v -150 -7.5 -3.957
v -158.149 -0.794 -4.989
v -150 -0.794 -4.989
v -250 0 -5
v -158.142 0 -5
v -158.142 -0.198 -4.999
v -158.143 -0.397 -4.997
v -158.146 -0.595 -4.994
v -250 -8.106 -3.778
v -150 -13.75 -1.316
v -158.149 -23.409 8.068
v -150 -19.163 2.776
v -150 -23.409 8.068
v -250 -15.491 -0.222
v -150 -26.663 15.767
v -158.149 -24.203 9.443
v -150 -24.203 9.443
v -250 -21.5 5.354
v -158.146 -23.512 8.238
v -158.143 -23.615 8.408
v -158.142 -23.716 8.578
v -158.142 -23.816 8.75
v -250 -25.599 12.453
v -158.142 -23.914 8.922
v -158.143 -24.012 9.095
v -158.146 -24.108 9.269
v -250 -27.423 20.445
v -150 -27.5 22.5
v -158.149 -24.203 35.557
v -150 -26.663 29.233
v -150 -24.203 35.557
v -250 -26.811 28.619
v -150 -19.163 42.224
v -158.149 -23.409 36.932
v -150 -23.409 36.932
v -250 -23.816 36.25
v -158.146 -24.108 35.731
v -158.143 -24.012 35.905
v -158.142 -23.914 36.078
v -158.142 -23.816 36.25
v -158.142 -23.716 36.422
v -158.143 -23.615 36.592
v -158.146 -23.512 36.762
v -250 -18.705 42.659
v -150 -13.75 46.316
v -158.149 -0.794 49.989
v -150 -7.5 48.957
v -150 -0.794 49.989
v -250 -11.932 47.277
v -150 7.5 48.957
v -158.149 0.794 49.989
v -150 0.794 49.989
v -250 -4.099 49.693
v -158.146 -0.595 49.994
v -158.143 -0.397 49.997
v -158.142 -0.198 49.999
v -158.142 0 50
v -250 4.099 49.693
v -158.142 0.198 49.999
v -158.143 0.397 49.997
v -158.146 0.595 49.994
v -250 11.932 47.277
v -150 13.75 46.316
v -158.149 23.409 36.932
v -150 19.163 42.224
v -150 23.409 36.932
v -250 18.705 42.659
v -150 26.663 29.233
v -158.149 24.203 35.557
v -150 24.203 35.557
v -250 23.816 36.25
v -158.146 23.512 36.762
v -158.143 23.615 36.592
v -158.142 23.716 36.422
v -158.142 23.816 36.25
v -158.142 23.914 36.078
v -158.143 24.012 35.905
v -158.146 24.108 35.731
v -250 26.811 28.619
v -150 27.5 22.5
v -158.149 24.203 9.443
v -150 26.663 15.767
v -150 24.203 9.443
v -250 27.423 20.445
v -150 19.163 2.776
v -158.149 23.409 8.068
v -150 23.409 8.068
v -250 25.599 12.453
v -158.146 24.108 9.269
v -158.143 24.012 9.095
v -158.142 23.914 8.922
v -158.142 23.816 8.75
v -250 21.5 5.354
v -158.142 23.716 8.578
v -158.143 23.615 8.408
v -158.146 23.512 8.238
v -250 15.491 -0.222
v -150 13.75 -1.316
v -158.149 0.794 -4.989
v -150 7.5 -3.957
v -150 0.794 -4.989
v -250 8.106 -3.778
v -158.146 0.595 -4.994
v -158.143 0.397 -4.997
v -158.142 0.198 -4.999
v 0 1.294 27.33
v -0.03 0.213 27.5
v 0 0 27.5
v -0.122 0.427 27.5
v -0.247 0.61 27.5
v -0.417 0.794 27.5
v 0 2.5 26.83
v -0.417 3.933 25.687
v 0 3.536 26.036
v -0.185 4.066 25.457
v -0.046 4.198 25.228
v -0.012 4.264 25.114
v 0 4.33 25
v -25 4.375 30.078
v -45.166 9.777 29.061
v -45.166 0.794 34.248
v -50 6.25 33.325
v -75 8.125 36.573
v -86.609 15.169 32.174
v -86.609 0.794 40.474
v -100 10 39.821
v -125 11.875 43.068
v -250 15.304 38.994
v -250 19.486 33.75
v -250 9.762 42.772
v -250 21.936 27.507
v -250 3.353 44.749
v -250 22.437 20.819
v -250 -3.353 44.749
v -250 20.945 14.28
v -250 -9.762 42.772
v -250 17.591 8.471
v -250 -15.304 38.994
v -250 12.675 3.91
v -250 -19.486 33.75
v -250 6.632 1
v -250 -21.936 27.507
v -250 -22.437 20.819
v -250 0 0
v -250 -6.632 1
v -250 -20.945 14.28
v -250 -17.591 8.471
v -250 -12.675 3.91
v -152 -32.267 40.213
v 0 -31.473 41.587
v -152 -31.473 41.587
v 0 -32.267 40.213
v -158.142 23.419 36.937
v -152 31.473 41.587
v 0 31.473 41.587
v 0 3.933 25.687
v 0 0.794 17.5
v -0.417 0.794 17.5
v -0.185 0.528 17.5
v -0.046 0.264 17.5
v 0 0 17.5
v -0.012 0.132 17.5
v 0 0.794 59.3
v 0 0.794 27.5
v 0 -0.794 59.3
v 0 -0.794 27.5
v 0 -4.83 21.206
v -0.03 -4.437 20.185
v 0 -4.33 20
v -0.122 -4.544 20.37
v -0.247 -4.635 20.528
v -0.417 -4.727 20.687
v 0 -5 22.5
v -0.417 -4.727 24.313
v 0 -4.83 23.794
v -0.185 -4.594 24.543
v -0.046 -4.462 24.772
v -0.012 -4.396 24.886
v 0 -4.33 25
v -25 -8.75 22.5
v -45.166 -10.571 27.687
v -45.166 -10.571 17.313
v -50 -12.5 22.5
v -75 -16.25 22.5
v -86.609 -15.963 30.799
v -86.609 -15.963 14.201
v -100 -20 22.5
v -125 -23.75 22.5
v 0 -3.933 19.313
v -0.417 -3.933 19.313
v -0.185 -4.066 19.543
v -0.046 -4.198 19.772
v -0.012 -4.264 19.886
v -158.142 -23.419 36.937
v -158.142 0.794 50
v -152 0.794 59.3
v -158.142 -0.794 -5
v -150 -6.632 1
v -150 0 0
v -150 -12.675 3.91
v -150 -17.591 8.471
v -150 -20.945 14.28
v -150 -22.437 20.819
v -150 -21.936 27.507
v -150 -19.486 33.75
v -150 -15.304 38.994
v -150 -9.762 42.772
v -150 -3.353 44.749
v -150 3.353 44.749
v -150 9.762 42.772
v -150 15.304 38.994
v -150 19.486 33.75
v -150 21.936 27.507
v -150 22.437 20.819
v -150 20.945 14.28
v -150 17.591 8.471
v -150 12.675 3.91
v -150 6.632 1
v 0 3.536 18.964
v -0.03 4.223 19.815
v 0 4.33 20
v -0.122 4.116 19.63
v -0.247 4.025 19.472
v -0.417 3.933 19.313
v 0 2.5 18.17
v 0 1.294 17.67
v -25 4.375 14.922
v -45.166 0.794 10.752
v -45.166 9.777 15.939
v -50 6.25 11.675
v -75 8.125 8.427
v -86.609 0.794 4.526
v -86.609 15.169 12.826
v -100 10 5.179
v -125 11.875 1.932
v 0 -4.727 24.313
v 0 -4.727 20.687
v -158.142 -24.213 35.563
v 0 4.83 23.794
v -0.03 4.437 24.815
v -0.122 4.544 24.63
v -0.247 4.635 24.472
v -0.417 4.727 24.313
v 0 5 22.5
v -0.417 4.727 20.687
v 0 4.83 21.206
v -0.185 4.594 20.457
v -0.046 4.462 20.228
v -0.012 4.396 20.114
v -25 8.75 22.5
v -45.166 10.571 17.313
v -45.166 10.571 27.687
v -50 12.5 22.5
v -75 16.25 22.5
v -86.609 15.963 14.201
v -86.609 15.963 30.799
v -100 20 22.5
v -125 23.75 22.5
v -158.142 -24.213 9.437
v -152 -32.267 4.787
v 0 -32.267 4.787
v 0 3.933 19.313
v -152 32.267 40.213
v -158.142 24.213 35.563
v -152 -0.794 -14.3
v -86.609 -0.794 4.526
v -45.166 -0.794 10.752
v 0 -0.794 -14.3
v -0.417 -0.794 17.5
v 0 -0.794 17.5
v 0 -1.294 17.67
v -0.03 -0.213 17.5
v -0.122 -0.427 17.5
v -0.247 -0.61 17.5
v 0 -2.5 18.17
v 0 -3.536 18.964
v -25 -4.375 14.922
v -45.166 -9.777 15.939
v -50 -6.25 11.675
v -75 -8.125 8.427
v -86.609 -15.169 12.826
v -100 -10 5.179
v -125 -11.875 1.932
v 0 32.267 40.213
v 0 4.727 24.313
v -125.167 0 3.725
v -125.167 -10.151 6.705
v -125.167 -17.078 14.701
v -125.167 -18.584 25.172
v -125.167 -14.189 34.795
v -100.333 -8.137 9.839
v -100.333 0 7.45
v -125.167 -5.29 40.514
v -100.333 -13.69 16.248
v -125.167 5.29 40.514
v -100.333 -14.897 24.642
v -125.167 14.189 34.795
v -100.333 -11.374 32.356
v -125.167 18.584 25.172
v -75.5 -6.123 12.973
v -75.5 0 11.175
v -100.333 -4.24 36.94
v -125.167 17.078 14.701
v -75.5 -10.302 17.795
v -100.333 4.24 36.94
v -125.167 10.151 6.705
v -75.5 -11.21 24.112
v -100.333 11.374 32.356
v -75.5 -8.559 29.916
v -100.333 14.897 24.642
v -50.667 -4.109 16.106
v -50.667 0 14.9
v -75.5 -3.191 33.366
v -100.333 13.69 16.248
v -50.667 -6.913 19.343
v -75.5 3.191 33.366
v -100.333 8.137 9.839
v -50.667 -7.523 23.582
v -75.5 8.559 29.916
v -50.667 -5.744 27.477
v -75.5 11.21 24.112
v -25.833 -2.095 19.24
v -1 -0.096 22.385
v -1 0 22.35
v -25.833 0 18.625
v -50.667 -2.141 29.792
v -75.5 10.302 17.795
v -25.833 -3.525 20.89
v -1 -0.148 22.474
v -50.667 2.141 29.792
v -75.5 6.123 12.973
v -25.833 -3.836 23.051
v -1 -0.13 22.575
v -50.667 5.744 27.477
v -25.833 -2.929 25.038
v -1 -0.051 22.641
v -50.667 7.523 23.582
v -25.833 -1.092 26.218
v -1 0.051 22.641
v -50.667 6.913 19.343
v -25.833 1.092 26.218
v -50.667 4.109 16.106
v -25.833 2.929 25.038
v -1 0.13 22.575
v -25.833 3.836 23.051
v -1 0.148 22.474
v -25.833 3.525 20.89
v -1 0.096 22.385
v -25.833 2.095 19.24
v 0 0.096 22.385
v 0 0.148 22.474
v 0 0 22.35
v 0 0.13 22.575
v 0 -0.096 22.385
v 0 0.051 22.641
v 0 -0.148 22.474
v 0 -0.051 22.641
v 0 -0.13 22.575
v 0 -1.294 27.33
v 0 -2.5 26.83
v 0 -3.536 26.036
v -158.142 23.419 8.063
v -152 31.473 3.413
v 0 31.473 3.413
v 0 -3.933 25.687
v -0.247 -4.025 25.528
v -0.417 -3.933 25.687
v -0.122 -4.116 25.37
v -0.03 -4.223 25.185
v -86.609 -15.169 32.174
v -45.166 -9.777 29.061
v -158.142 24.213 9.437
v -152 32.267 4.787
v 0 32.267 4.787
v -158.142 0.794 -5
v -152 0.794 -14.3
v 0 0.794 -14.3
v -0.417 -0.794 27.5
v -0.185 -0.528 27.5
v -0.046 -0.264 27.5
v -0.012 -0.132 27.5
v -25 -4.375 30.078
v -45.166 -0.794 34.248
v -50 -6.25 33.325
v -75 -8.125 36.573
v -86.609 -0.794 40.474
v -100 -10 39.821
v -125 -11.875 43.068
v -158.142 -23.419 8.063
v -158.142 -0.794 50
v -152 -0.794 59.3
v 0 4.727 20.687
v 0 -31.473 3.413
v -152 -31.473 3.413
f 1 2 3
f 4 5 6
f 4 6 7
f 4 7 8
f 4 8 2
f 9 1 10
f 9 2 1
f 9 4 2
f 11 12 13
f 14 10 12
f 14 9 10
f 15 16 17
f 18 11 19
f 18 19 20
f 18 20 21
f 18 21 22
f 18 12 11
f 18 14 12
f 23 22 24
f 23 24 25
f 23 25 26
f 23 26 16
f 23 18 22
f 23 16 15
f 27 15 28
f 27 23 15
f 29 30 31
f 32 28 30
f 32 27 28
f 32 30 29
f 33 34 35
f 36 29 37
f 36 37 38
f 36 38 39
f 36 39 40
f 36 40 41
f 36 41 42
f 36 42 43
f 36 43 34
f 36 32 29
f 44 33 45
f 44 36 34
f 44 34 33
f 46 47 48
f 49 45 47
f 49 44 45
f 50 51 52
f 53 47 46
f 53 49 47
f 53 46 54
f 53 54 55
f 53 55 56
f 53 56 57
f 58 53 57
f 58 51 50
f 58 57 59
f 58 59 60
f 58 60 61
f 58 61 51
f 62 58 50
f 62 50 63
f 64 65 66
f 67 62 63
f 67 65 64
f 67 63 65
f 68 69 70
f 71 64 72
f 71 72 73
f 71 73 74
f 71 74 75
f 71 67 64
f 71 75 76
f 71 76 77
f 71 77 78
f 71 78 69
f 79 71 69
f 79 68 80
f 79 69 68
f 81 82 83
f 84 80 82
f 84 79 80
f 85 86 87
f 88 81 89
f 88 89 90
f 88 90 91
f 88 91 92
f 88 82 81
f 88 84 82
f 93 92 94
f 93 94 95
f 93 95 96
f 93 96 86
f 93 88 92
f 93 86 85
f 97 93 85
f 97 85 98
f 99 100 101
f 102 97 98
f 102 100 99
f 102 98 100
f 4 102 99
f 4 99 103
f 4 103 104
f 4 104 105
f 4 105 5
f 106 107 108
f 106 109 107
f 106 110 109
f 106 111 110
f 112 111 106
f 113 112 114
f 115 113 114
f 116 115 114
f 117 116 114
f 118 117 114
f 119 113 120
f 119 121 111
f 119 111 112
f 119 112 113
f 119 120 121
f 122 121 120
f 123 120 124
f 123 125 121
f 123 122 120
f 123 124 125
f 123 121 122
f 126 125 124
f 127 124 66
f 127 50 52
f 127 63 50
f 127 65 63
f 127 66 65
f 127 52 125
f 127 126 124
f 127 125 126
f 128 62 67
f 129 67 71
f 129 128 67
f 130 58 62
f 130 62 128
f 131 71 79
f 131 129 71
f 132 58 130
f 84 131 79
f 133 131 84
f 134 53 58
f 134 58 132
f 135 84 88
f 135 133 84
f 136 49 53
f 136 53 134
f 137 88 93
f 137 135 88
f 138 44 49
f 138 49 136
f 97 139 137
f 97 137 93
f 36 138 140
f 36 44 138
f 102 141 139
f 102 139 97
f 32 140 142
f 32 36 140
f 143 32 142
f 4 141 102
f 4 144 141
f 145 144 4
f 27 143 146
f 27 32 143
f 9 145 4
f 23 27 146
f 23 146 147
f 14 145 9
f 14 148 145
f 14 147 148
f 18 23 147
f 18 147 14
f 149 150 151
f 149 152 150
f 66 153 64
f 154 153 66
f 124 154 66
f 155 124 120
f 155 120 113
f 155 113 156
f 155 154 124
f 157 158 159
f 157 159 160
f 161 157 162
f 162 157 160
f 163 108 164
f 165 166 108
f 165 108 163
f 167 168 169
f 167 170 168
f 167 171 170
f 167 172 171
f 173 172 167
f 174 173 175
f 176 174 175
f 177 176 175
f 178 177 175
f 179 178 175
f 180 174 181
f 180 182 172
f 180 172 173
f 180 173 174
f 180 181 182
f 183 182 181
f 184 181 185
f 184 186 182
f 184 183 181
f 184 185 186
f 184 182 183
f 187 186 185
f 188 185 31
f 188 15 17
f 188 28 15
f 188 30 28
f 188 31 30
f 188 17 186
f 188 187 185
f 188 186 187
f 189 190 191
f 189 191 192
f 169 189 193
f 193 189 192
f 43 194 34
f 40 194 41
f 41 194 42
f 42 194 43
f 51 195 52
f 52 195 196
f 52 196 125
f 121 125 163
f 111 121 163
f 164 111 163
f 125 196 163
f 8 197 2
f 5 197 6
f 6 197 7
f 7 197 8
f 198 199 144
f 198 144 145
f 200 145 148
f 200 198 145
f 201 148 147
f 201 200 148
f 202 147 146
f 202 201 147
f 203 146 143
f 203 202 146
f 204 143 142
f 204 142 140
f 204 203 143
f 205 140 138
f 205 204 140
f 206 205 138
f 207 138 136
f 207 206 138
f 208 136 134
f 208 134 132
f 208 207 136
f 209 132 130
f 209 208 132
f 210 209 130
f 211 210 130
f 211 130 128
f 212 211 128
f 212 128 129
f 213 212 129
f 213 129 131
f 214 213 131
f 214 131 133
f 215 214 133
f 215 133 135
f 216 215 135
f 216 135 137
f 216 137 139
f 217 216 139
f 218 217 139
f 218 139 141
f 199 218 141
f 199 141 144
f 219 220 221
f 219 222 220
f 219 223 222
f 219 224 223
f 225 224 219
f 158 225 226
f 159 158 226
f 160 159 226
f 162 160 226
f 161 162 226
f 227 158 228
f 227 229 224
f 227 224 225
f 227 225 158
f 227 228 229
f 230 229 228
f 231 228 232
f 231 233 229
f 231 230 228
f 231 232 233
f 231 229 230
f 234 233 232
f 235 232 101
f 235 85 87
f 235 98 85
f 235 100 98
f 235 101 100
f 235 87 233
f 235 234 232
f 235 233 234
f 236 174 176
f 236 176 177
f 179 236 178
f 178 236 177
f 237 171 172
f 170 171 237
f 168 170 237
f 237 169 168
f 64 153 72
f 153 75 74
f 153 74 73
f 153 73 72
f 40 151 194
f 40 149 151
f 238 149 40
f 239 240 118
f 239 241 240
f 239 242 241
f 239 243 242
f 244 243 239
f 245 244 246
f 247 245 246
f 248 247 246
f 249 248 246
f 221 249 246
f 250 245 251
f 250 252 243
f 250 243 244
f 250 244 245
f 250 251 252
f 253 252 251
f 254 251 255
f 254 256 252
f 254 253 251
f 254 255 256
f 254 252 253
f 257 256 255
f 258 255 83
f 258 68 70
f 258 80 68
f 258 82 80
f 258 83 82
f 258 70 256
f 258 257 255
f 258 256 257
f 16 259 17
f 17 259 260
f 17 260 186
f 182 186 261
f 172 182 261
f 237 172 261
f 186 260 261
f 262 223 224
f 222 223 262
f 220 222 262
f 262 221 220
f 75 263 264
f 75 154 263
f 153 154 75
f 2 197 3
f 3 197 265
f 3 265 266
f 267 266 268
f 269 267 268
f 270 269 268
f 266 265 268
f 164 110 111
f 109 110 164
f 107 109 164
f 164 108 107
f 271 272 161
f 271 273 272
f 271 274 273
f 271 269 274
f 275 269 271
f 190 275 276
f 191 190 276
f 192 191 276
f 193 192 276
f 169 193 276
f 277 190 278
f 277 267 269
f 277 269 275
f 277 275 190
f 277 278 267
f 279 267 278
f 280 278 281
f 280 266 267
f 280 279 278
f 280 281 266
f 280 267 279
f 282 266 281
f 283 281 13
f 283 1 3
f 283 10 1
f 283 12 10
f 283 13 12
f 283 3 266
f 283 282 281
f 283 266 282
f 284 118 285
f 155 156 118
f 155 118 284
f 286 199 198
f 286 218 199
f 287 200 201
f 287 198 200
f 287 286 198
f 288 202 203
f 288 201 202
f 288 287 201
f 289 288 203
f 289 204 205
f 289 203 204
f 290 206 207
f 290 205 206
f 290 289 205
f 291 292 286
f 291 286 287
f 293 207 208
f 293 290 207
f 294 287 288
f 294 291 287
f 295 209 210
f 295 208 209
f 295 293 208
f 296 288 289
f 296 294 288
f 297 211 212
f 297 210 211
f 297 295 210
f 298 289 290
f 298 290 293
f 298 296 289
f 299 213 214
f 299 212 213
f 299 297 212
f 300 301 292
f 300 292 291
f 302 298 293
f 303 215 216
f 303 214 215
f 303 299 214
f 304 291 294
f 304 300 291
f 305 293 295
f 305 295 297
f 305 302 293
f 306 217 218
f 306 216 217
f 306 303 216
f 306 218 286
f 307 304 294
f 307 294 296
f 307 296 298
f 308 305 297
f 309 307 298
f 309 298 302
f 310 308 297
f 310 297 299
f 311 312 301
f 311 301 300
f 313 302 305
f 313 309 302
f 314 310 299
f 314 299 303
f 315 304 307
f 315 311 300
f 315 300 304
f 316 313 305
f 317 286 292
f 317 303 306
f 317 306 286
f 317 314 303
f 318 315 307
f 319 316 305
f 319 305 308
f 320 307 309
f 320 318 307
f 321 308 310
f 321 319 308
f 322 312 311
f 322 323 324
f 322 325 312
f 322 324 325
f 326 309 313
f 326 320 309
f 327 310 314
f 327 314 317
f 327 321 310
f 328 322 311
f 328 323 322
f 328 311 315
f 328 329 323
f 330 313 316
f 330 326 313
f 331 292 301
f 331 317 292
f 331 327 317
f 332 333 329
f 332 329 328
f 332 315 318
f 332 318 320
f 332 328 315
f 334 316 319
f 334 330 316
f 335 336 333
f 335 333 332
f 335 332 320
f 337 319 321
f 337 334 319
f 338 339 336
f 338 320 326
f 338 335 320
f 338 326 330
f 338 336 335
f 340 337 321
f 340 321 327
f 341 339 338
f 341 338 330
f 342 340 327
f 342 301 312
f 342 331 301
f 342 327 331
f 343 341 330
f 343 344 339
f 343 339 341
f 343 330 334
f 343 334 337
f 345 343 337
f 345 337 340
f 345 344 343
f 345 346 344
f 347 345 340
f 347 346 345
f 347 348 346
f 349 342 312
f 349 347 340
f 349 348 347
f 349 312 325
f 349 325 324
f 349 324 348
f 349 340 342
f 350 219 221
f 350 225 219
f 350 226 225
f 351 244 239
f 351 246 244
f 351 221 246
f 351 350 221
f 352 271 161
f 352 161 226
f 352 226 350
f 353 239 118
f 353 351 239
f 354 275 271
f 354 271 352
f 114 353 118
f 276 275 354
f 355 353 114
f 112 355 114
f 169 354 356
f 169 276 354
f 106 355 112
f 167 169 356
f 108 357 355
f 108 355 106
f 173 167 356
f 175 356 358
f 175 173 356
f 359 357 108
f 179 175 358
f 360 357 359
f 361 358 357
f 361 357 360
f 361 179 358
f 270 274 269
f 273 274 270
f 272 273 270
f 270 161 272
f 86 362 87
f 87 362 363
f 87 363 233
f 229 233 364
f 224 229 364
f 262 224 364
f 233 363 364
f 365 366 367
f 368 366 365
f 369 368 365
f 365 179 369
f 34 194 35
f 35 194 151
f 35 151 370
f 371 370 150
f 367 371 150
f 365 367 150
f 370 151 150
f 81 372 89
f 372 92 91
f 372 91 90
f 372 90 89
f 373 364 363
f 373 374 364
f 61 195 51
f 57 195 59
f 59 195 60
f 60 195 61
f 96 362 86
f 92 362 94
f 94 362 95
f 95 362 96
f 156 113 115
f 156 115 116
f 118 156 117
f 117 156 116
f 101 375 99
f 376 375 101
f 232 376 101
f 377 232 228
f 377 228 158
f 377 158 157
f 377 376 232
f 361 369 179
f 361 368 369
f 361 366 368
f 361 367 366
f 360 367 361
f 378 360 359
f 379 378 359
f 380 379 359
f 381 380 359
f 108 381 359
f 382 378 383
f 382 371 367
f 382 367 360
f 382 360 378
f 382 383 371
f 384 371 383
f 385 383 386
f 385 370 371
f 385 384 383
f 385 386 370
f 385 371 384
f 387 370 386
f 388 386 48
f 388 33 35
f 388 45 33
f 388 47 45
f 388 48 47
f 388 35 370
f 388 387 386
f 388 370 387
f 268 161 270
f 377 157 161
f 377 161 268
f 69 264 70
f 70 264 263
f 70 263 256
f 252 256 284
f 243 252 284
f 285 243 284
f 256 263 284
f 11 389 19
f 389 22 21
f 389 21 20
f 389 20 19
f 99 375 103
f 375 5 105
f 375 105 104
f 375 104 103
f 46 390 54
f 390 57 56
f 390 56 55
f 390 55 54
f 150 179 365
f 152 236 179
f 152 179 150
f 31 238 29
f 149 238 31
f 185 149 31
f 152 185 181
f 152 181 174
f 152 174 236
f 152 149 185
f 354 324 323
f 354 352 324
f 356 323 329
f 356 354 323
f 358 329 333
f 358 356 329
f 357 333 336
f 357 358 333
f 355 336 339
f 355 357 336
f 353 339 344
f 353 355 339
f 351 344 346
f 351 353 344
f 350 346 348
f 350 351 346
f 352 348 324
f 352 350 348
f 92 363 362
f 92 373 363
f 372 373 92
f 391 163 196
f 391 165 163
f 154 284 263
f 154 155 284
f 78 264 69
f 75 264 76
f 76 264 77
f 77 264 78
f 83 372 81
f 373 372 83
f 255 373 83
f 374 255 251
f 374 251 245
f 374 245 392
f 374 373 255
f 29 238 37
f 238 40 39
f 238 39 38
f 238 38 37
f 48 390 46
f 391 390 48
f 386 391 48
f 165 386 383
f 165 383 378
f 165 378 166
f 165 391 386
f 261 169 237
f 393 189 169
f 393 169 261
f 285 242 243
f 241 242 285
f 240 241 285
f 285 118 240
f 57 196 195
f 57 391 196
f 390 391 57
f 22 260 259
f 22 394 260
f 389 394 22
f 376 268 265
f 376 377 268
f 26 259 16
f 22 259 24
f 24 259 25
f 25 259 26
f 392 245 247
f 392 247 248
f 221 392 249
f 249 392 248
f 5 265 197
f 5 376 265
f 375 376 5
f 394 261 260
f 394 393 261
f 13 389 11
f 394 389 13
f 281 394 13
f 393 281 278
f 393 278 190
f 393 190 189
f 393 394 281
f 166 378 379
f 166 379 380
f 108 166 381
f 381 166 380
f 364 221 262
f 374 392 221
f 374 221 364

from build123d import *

# Parameters (mm, degrees)
BOSS_EXTRUDE2_DEPTH = 0.79375
CIRPATTERN1_COUNT   = 6


with BuildPart() as part:
    # Sketch1 → Revolve1 (revolve)
    with BuildSketch(Plane(origin=(0, 0, 0), x_dir=(1, 0, 0), z_dir=(0, 1, 0))):
        Polygon((-250, 0), (-150, 0), (-1, -22.35), (0, -22.35), (0, -17.5), (-150, 5), (-250, 5), align=None)
    revolve1 = revolve(axis=Axis((0, 0, 22.5), (-1, 0, 0)))

    # Sketch3 → Boss-Extrude2 (add, symmetric)
    with BuildSketch(Plane(origin=(0, 0, 0), x_dir=(1, 0, 0), z_dir=(0, 1, 0))):
        Polygon((-152, 14.3), (-158.141509434, 5), (-150, 5), (0, -17.5), (0, 14.3), align=None)
        Polygon((-158.141509434, 5), (-159.462264151, 3), (-150.149165611, 3), (-13.482498944, -17.5), (0, -17.5), (-150, 5), align=None)
    boss_extrude2 = extrude(amount=BOSS_EXTRUDE2_DEPTH, both=True)

    # CirPattern1: Revolve1, Boss-Extrude2 ×6 about axis
    cirpattern1_axis = Axis((0, 0, 22.5), (1, 0, 0))
    add([revolve1.rotate(cirpattern1_axis, i * 360 / CIRPATTERN1_COUNT) for i in range(1, CIRPATTERN1_COUNT)])
    add([boss_extrude2.rotate(cirpattern1_axis, i * 360 / CIRPATTERN1_COUNT) for i in range(1, CIRPATTERN1_COUNT)])


solid = part.part
